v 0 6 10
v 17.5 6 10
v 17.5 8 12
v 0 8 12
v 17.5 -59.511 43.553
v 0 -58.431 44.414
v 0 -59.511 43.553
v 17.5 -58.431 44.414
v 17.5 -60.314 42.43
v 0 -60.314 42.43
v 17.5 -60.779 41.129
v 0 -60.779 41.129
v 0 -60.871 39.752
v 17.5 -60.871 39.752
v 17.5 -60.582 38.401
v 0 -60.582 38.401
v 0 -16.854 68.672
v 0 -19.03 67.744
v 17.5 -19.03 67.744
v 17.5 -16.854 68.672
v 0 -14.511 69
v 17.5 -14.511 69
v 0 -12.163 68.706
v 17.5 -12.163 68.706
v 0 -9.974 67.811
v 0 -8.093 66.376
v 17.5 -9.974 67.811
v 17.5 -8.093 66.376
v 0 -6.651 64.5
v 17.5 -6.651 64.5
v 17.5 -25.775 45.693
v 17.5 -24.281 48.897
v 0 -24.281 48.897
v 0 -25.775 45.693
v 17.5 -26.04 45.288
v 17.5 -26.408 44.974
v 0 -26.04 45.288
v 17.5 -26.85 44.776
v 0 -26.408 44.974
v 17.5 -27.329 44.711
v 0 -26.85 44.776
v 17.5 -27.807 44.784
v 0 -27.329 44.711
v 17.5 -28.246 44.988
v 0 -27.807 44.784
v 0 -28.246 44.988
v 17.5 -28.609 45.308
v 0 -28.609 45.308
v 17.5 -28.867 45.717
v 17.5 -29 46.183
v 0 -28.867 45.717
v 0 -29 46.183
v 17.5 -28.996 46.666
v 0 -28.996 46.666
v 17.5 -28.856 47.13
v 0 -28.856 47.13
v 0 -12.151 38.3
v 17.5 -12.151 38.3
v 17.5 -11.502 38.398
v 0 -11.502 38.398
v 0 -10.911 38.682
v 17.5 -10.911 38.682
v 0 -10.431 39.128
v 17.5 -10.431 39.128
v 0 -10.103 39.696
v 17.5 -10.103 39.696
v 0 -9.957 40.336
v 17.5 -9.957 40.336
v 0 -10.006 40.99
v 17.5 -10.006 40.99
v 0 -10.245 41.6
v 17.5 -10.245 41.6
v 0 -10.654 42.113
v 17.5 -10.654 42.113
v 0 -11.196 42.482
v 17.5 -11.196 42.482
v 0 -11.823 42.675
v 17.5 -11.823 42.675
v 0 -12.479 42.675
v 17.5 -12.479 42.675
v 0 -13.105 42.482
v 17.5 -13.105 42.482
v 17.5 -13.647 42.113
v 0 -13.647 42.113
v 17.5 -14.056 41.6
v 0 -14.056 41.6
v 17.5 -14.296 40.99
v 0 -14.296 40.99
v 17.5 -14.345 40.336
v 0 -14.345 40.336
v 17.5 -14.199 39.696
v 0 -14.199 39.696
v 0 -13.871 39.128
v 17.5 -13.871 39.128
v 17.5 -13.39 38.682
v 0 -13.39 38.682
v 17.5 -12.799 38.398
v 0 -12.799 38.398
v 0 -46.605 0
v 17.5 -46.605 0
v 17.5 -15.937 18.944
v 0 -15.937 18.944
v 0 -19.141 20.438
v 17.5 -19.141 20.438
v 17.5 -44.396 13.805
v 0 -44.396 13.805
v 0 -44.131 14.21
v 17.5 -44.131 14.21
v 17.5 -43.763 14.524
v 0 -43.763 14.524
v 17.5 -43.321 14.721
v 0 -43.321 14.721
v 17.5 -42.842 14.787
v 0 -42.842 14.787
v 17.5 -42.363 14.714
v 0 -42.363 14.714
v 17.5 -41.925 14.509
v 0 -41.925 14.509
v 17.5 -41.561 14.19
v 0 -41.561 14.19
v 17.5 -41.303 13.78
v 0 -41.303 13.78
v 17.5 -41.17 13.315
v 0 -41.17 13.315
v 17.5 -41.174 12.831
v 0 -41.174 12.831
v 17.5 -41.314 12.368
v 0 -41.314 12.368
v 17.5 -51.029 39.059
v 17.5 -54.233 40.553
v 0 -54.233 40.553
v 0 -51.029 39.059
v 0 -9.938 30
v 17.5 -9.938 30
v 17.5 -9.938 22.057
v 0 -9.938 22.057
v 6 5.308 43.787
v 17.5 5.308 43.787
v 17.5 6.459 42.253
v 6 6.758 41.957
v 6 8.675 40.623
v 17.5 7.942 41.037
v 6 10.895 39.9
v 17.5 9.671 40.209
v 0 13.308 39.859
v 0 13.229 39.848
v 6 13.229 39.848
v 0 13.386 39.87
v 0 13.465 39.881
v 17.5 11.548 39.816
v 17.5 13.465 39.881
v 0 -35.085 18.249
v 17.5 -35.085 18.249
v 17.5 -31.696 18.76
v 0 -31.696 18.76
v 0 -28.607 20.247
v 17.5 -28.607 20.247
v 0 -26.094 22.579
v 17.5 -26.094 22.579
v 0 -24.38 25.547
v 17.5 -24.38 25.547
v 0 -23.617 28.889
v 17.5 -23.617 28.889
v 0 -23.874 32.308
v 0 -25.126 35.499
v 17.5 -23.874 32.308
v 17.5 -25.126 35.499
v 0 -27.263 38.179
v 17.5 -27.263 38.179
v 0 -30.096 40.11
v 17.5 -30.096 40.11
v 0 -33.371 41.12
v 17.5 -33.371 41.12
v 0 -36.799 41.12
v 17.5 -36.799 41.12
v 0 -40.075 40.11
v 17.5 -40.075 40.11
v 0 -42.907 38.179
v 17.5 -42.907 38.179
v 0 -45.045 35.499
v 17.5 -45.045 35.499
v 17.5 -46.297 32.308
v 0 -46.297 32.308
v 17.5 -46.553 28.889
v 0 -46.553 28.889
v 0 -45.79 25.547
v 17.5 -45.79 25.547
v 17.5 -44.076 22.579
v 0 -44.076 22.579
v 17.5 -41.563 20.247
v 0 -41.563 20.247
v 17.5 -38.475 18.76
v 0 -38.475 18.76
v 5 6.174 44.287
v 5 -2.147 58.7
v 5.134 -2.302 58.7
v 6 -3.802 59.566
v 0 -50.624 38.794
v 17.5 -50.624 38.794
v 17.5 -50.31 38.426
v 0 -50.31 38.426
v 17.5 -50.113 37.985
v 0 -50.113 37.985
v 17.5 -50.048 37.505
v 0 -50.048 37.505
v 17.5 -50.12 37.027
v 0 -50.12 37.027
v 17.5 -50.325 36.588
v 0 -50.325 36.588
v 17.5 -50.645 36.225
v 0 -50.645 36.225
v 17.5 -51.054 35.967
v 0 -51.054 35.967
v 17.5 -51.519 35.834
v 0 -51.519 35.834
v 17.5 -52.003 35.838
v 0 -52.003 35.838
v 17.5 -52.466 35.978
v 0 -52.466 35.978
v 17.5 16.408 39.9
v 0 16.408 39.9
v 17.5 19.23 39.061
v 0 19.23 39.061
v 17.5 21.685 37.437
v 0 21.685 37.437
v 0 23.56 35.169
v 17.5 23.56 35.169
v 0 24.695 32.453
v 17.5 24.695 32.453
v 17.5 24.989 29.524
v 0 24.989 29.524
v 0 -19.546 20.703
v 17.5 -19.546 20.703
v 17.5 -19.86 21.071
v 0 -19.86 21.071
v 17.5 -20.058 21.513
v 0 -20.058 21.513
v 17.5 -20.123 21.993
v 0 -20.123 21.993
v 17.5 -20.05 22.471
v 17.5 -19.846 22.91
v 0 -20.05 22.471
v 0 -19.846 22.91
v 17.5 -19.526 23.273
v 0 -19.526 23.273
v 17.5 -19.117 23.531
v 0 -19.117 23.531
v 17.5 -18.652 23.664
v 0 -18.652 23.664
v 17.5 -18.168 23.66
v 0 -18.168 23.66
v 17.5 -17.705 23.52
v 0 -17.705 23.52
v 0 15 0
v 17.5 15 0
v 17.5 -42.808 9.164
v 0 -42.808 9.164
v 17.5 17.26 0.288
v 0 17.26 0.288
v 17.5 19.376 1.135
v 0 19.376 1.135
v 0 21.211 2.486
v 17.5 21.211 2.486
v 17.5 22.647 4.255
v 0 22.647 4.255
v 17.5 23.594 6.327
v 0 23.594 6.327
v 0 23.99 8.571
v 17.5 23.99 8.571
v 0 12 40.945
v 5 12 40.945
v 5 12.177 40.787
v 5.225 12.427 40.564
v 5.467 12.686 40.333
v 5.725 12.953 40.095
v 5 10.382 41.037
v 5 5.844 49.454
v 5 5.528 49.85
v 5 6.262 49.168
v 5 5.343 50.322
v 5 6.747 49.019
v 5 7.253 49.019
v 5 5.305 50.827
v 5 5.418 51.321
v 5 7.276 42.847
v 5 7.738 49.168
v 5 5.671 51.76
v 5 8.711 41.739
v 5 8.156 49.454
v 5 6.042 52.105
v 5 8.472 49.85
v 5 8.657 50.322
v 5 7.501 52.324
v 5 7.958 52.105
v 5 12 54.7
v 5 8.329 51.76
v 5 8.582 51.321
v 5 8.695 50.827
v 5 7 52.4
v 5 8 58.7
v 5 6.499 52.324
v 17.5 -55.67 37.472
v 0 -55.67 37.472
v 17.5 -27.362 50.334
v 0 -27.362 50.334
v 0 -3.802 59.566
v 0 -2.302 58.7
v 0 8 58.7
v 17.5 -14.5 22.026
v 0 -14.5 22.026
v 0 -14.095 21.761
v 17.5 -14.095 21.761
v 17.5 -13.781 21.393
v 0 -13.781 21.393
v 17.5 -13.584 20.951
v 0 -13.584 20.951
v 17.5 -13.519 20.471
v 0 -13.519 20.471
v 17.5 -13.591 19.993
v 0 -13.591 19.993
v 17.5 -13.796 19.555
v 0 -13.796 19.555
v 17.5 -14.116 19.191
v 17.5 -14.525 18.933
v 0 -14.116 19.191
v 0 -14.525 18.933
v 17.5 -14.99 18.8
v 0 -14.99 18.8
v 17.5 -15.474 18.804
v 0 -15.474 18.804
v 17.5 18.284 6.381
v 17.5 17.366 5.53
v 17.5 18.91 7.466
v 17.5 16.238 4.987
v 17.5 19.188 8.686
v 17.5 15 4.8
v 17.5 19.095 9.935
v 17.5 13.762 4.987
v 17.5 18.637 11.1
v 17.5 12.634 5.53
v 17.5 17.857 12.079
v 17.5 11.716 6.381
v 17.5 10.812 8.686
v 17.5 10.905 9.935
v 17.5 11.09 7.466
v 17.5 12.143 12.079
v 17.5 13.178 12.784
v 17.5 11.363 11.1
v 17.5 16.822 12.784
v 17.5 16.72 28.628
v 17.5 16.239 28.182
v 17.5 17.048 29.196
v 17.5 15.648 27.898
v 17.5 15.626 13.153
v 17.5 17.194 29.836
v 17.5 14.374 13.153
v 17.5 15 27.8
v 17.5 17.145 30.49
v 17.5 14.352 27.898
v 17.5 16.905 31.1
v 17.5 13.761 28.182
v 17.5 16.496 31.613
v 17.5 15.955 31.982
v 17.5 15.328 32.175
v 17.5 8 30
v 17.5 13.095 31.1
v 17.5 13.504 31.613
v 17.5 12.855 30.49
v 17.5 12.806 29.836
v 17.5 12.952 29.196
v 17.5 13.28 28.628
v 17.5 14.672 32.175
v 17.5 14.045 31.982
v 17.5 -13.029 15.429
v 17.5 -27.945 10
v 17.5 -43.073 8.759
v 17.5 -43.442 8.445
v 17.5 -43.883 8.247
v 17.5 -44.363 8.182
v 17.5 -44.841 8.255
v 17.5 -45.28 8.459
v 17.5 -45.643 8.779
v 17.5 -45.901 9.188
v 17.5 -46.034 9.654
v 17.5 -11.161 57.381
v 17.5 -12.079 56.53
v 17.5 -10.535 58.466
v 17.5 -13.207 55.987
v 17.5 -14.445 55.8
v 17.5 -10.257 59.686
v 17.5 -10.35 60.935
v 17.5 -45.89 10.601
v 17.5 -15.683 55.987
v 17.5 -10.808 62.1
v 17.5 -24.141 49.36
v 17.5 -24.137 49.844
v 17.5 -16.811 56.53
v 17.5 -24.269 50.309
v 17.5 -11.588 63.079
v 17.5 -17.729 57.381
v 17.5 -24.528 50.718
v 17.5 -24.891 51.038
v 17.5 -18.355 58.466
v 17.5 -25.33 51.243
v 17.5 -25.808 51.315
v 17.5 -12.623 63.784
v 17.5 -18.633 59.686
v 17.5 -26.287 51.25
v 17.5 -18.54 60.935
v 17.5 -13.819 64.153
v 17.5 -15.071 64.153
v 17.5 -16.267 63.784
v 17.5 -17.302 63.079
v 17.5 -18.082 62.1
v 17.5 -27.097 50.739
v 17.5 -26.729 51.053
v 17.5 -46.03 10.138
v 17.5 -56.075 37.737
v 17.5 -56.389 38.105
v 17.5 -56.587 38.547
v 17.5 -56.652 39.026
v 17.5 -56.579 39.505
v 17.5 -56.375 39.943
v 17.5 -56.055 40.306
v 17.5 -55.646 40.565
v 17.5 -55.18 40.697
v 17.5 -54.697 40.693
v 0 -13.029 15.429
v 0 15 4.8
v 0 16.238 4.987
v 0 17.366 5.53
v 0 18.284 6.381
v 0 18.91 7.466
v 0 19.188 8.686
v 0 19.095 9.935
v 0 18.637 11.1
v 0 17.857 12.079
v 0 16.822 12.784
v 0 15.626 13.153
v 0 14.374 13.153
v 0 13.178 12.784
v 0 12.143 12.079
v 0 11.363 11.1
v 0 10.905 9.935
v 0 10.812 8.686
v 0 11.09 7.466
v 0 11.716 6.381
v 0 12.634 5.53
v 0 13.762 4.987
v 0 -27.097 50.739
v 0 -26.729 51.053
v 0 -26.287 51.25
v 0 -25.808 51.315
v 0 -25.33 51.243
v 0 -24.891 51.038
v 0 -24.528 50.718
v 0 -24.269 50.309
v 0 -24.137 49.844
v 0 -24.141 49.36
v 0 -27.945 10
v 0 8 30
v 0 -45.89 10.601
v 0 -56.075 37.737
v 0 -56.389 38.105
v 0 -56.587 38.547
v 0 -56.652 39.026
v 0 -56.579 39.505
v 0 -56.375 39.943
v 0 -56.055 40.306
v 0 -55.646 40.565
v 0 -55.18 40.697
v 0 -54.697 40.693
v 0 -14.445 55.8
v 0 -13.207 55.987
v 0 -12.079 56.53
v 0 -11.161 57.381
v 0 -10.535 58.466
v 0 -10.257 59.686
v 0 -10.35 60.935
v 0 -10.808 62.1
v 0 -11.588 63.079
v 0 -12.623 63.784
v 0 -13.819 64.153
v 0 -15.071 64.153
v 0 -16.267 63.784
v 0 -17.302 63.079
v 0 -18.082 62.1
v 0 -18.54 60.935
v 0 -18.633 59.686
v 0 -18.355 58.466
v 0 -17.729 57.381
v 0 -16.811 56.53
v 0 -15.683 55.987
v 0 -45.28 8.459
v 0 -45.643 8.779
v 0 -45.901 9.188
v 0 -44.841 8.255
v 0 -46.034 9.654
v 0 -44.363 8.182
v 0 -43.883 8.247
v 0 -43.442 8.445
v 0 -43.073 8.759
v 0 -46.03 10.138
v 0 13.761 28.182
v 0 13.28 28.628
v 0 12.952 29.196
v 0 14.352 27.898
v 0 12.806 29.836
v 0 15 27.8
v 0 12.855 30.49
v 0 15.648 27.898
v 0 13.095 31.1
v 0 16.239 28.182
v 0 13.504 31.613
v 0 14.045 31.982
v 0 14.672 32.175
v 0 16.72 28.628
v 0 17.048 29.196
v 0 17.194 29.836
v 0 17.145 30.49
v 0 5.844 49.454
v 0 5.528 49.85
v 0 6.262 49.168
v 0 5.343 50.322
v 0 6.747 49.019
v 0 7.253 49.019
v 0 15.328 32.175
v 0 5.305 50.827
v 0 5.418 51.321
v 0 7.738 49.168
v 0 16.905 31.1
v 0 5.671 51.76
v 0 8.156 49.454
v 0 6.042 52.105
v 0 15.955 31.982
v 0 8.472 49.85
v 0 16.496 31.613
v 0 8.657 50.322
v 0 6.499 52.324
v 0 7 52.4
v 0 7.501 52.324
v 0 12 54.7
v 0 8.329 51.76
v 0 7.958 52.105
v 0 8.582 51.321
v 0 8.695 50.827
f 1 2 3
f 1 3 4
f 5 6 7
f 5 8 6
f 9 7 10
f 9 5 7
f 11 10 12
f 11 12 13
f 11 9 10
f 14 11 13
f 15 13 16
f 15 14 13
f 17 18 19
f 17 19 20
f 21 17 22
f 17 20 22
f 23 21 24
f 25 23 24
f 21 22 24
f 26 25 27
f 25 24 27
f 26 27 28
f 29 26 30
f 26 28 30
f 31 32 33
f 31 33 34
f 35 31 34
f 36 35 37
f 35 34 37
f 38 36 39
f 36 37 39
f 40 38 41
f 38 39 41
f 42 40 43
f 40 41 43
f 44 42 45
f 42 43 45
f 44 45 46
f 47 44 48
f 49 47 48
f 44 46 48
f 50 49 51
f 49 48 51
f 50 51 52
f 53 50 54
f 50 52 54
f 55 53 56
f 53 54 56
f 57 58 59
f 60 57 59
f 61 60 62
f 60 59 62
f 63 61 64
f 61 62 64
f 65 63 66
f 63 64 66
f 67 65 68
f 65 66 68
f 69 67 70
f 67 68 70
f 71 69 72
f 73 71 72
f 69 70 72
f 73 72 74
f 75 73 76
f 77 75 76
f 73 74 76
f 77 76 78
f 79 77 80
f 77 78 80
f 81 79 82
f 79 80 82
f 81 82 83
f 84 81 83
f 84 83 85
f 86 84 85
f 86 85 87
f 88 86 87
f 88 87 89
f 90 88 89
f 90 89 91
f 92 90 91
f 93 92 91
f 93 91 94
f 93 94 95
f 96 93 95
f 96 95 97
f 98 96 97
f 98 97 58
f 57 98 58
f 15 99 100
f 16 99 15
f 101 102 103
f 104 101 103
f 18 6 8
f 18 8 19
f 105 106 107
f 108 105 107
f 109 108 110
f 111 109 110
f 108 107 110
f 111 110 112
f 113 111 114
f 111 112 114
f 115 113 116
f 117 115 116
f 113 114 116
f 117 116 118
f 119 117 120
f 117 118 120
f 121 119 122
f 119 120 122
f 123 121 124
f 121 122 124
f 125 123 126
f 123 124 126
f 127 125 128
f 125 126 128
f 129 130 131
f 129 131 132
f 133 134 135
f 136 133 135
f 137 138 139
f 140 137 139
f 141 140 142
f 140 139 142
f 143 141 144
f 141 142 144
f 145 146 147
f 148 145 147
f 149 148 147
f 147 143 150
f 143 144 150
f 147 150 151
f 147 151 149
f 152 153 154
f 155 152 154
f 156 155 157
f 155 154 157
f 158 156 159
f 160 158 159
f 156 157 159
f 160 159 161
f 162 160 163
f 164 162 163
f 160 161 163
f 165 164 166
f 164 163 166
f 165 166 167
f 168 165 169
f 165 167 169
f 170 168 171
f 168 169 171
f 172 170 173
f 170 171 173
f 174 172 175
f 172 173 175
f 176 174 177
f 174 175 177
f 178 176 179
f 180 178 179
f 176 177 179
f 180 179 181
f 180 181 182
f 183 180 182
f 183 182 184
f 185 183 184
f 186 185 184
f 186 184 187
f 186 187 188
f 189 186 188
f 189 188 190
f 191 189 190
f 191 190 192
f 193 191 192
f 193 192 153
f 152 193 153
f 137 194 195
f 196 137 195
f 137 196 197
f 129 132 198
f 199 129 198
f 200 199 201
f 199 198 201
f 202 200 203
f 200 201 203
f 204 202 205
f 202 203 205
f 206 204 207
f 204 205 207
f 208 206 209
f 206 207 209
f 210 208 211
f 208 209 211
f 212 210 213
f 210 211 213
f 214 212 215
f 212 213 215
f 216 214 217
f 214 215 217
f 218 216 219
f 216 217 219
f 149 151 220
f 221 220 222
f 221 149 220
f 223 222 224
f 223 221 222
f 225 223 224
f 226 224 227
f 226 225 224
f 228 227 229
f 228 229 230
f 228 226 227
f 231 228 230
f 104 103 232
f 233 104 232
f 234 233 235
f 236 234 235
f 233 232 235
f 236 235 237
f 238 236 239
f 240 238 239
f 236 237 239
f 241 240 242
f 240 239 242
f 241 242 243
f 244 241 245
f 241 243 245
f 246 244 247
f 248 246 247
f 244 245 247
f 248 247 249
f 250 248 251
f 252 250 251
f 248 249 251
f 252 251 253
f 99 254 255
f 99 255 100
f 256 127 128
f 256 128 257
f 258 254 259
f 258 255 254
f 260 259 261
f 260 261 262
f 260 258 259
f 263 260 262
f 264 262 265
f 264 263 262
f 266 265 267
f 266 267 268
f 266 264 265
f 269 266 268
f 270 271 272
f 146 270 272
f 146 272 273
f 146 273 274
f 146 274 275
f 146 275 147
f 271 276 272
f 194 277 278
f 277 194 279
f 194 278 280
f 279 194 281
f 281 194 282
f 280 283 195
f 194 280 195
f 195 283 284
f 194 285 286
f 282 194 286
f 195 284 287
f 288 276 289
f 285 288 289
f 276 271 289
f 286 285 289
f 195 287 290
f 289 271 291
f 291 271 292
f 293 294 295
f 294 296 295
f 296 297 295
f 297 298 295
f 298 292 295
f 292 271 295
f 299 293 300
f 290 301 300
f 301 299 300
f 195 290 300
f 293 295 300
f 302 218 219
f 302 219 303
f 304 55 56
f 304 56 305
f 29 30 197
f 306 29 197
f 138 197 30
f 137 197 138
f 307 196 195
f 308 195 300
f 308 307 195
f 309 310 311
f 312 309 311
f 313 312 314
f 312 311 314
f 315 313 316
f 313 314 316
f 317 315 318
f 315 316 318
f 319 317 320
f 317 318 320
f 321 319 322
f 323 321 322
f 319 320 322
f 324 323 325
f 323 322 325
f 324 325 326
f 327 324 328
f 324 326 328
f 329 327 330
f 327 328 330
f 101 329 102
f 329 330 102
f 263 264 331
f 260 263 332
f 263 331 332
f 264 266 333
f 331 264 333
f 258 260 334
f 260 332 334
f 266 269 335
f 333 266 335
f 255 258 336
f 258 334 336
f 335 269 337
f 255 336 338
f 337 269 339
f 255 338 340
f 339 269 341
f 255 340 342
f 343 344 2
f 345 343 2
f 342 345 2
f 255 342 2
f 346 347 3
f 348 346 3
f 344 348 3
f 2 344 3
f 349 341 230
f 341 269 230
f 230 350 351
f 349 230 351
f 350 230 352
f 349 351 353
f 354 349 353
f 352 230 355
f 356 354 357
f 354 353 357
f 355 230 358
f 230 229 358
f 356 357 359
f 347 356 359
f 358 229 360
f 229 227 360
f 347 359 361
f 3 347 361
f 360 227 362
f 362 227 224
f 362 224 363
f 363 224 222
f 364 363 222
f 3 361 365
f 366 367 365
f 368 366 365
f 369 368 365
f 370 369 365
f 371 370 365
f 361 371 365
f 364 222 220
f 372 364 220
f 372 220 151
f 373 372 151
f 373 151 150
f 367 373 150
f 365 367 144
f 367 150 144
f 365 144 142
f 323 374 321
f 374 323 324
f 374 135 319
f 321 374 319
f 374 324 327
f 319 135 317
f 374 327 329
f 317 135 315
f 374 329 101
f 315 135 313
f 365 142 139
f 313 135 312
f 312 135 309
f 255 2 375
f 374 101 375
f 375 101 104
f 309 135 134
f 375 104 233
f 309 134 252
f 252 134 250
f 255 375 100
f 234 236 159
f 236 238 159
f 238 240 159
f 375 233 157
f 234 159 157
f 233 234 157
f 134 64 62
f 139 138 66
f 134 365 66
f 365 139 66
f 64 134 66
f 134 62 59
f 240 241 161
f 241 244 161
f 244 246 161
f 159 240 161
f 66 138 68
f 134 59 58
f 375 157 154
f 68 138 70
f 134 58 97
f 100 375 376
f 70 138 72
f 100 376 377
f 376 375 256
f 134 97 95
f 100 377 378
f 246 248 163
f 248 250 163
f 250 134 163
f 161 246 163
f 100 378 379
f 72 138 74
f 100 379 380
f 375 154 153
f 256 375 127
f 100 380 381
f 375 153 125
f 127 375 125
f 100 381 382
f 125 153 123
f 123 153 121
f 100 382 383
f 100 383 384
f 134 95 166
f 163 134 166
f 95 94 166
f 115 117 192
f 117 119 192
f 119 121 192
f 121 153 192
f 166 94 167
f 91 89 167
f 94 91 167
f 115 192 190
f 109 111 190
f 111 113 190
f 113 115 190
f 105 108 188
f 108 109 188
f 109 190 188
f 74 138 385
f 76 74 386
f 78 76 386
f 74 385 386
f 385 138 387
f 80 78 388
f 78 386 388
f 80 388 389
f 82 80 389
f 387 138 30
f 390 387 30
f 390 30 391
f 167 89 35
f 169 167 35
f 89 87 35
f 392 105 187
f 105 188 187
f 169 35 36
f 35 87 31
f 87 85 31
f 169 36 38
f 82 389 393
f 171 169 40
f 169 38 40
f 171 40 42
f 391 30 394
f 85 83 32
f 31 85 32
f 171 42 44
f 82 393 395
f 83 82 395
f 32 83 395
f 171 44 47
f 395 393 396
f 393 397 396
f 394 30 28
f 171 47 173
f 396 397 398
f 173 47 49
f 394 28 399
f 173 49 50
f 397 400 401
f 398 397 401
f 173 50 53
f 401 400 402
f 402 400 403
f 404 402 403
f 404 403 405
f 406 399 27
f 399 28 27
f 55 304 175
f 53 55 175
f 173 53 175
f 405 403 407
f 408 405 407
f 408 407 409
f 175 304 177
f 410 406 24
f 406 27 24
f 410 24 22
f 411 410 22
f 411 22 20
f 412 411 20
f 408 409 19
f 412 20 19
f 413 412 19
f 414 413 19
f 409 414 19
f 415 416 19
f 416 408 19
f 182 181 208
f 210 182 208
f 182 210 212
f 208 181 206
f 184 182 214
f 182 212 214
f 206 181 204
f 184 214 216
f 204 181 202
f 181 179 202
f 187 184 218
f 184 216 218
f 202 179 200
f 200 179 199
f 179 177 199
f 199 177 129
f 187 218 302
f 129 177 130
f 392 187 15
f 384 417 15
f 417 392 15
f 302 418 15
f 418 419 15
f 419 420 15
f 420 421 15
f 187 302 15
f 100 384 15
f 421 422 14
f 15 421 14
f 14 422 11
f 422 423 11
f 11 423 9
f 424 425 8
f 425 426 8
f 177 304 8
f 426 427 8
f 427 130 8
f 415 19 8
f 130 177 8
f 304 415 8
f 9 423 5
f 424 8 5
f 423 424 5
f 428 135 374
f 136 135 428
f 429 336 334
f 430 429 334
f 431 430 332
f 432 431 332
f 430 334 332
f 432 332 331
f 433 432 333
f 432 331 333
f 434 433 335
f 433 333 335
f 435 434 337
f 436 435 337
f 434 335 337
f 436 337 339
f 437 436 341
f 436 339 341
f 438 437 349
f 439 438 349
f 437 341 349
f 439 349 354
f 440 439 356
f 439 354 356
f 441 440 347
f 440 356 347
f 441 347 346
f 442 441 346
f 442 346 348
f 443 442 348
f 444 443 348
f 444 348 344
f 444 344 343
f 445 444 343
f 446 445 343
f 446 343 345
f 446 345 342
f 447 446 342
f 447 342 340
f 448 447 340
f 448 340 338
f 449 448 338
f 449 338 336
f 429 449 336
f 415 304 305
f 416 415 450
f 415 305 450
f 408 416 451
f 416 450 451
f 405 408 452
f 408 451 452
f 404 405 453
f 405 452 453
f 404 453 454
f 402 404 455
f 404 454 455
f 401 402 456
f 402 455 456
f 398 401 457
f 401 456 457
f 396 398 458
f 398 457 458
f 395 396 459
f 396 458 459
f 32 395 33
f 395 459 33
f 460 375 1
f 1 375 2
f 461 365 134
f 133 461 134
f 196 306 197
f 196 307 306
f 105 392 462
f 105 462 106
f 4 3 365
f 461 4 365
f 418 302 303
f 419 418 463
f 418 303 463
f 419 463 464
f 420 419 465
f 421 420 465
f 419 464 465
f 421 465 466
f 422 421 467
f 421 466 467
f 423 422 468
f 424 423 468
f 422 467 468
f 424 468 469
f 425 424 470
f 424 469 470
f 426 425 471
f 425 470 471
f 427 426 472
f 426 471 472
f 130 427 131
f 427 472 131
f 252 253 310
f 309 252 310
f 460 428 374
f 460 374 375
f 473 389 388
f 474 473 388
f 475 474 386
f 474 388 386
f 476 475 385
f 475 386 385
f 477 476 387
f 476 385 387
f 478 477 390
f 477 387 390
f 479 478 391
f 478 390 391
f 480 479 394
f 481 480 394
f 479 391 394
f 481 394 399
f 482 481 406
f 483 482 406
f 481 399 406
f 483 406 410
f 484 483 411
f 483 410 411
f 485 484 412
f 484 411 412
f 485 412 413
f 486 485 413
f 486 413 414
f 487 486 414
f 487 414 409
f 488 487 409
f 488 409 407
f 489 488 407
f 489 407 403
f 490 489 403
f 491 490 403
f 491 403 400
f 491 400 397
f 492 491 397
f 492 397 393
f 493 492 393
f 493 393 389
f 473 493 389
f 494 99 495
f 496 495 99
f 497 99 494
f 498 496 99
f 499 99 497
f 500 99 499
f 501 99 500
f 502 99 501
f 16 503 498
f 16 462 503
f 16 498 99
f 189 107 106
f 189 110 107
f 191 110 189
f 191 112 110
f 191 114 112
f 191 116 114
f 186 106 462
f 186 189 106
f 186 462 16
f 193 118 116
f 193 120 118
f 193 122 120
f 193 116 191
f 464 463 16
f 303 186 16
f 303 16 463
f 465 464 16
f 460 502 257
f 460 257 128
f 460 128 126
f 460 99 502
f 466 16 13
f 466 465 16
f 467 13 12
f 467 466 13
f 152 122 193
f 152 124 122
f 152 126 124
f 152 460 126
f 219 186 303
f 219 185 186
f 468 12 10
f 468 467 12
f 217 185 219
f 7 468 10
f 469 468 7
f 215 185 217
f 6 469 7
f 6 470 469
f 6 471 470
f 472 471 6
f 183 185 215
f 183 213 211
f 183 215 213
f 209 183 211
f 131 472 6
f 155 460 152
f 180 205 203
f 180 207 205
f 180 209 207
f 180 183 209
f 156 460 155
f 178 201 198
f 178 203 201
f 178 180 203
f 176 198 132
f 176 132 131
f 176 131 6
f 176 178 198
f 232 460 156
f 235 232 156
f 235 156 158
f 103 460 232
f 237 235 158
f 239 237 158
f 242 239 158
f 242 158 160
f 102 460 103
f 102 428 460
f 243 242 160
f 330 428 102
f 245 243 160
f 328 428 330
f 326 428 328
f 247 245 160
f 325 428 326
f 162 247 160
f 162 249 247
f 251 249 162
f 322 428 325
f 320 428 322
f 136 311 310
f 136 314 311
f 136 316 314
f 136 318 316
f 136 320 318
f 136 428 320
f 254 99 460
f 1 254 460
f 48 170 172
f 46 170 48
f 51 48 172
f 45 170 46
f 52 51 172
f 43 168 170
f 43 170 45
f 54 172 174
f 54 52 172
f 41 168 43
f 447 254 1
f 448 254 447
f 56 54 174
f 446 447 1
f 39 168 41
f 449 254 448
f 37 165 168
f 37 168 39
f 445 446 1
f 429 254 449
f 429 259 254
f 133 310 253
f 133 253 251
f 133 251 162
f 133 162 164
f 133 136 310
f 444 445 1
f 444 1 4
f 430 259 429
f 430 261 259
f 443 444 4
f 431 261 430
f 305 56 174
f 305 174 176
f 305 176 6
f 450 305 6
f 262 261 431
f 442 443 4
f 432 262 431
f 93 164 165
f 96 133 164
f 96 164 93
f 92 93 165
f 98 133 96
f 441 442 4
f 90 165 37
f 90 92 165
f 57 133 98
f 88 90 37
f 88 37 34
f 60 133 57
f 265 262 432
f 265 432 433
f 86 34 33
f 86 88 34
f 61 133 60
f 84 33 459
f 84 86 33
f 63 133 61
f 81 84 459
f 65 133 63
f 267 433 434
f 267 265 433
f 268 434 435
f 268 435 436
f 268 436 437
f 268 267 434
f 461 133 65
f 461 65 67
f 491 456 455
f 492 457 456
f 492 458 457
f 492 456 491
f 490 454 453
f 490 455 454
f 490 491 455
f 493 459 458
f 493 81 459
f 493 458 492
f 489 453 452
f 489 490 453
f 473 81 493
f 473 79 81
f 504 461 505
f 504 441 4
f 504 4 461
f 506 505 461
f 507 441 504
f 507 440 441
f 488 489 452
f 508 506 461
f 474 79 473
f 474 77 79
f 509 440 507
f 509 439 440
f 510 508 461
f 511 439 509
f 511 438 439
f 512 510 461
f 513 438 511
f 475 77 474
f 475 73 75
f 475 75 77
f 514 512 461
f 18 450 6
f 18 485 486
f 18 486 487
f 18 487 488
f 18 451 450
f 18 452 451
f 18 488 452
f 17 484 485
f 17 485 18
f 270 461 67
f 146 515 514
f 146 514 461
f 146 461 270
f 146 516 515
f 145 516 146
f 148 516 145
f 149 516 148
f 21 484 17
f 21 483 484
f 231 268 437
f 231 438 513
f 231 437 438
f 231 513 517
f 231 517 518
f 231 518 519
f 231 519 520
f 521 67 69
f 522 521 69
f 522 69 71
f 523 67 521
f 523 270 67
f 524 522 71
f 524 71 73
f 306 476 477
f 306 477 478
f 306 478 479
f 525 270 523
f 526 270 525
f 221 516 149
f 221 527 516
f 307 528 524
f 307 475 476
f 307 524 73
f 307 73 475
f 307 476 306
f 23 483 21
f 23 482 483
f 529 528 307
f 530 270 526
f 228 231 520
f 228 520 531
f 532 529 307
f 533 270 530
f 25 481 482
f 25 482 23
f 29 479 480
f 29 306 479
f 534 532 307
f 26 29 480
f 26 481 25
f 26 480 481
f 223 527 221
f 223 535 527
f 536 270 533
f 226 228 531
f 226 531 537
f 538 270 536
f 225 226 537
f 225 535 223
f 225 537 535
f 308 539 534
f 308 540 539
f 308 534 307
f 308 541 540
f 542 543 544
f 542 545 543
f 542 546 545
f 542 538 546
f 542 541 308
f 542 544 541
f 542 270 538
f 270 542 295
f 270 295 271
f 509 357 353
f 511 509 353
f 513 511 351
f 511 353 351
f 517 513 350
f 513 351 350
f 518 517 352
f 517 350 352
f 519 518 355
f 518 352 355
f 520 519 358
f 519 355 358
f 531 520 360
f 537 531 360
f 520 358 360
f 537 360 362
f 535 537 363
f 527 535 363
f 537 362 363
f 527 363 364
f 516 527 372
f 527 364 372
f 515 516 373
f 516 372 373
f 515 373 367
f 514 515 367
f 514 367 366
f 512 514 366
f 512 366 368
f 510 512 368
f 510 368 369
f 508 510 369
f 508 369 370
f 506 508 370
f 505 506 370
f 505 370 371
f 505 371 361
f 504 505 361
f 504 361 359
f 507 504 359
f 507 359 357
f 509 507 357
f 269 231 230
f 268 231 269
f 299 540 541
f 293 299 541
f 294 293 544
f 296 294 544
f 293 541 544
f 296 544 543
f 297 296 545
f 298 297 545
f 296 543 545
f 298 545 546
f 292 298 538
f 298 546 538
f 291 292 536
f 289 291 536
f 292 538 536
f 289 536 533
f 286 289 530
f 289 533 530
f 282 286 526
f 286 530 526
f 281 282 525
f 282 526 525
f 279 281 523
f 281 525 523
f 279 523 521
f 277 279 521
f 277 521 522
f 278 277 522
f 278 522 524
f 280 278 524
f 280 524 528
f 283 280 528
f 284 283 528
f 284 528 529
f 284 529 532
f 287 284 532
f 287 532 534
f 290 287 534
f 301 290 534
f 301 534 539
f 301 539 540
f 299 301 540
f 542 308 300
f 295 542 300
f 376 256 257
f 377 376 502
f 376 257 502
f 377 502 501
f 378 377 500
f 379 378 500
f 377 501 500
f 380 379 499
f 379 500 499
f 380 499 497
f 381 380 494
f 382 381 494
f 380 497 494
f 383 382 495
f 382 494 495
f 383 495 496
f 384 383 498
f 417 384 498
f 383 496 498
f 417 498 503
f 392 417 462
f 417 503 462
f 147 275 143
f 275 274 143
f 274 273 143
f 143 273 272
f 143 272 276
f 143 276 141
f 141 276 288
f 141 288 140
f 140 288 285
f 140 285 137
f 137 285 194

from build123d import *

# Parameters (mm, degrees)
BOSS_EXTRUDE1_DEPTH = 17.5
BOSS_EXTRUDE2_DEPTH = 5
CUT_EXTRUDE1_DEPTH  = 97.89865525603899
CUT_EXTRUDE2_DEPTH  = 97.89865525603899
CUT_EXTRUDE3_DEPTH  = 97.89865525603899
CUT_EXTRUDE4_DEPTH  = 97.89865525603899
CUT_EXTRUDE5_DEPTH  = 97.898655256039
HOLE1_D             = 3.4
HOLE2_D             = 8.4
HOLE3_D             = 4.4
HOLE4_D             = 23
HOLE5_D             = 8.4
HOLE6_D             = 4.4
FILLET1_R           = 8
CHAMFER1_SIZE       = 3.2892742843300167
CHAMFER1_SIZE2      = 5.503472902596259
CHAMFER2_SIZE       = 1.0000000000000073
CHAMFER3_SIZE       = 3.9999999999999973
CHAMFER4_SIZE       = 1.9999999999999982
CHAMFER5_SIZE       = 1.154784669
CHAMFER6_SIZE       = 0.9999999999999983
FILLET2_R           = 5
FILLET3_R           = 8.99999999999999
FILLET4_R           = 9.000000000000002


with BuildPart() as part:
    # Sketch1 → Boss-Extrude1 (new body)
    with BuildSketch(Plane(origin=(0, 0, 0), x_dir=(-6e-17, -1, 0), z_dir=(-1, 6e-17, 0))):
        with BuildLine():
            Line((11.200465877219063, 72.38053808131822), (-8.757531911002138, 37.812271894771776))
            ThreePointArc((-8.757531911002138, 37.812271894771776), (-19.5478712071735, 38.906001767514), (-24.988655696858714, 29.523809523809472))
            Line((-24.988655696858714, 29.523809523809472), (-23.581163303210467, 5.42e-15))
            Line((-23.581163303210467, 5.42e-15), (46.60534104687875, -6.94e-15))
            Line((46.60534104687875, -6.94e-15), (62.00126690227817, 42.299958639307405))
            Line((62.00126690227817, 42.299958639307405), (11.200465877219063, 72.38053808131822))
        make_face()
    extrude(amount=-BOSS_EXTRUDE1_DEPTH)

    # Sketch2 → Boss-Extrude2 (add)
    with BuildSketch(Plane(origin=(0, 0, 0), x_dir=(-6e-17, -1, 0), z_dir=(-1, 6e-17, 0))):
        with BuildLine():
            Line((-8.757531911002138, 37.812271894771776), (3.3020035333110394, 58.69999999999994))
            Line((3.3020035333110394, 58.69999999999994), (-12.000000000000004, 58.699999999999946))
            Line((-12.000000000000004, 58.699999999999946), (-12.000000000000004, 39.539392014169366))
            ThreePointArc((-12.000000000000004, 39.539392014169366), (-10.298772493194686, 38.826010419734104), (-8.757531911002138, 37.812271894771776))
        make_face()
    extrude(amount=-BOSS_EXTRUDE2_DEPTH)

    # Sketch3 → Cut-Extrude1 (cut, through all)
    with BuildSketch(Plane.ZY):
        with BuildLine():
            Line((18.94418997404675, -15.937202057164905), (20.43837116769735, -19.141483967443826))
            ThreePointArc((20.43837116769735, -19.141483967443826), (22.697545450618843, -19.96375616044696), (23.519817643621966, -17.70458187752546))
            Line((23.519817643621966, -17.70458187752546), (22.02563644997135, -14.500299967246516))
            ThreePointArc((22.02563644997135, -14.500299967246516), (19.766462167049855, -13.67802777424341), (18.94418997404675, -15.937202057164905))
        make_face()
    extrude(amount=-CUT_EXTRUDE1_DEPTH, mode=Mode.SUBTRACT)

    # Sketch4 → Cut-Extrude2 (cut, through all)
    with BuildSketch(Plane.ZY):
        with BuildLine():
            Line((48.89693341141304, -24.280652217339153), (45.692651501134065, -25.774833410989757))
            ThreePointArc((45.692651501134065, -25.774833410989757), (44.87037930813095, -28.034007693911235), (47.12955359105242, -28.85627988691438))
            Line((47.12955359105242, -28.85627988691438), (50.33383550133139, -27.362098693263775))
            ThreePointArc((50.33383550133139, -27.362098693263775), (51.156107694334516, -25.102924410342293), (48.89693341141304, -24.280652217339153))
        make_face()
    extrude(amount=-CUT_EXTRUDE2_DEPTH, mode=Mode.SUBTRACT)

    # Sketch5 → Cut-Extrude3 (cut, through all)
    with BuildSketch(Plane.ZY):
        with BuildLine():
            Line((35.97785558166356, -52.46601583434486), (37.47203677531419, -55.6702977446238))
            ThreePointArc((37.47203677531419, -55.6702977446238), (39.73121105823568, -56.4925699376269), (40.55348325123879, -54.233395654705404))
            Line((40.55348325123879, -54.233395654705404), (39.059302057588205, -51.02911374442645))
            ThreePointArc((39.059302057588205, -51.02911374442645), (36.80012777466672, -50.20684155142337), (35.97785558166356, -52.46601583434486))
        make_face()
    extrude(amount=-CUT_EXTRUDE3_DEPTH, mode=Mode.SUBTRACT)

    # Sketch6 → Cut-Extrude4 (cut, through all)
    with BuildSketch(Plane.ZY):
        with BuildLine():
            Line((10.600739813872503, -45.8899454945312), (13.805021724151473, -44.395764300880586))
            ThreePointArc((13.805021724151473, -44.395764300880586), (14.627293917154569, -42.136590017959094), (12.36811963423308, -41.314317824955985))
            Line((12.36811963423308, -41.314317824955985), (9.163837723954103, -42.8084990186066))
            ThreePointArc((9.163837723954103, -42.8084990186066), (8.341565530951023, -45.06767330152808), (10.600739813872503, -45.8899454945312))
        make_face()
    extrude(amount=-CUT_EXTRUDE4_DEPTH, mode=Mode.SUBTRACT)

    # Sketch7 → Cut-Extrude5 (cut, through all)
    with BuildSketch(Plane(origin=(17.5, -1.07e-15, 0), x_dir=(0, 0, -1), z_dir=(1, -6e-17, 0))):
        Polygon((-30.000000000000007, 8.000000000000005), (-30.000000000000007, -9.938112905604582), (-16.55393055212617, -9.938112905604578), (-10.000000000000002, -27.94488910624502), (-10.000000000000002, 8.000000000000005), align=None)
    extrude(amount=-CUT_EXTRUDE5_DEPTH, mode=Mode.SUBTRACT)

    # Hole1 (through all)
    with Locations(Plane(origin=(5, -3.1e-16, 0), x_dir=(0, 0, -1), z_dir=(1, -6e-17, 0))):
        with Locations((-50.7, 7)):
            Hole(HOLE1_D / 2)

    # Hole2 (through all)
    with Locations(Plane.ZY):
        with Locations((9, 15)):
            Hole(HOLE2_D / 2)

    # Hole3 (through all)
    with Locations(Plane.ZY):
        with Locations((40.5, -12.150669091)):
            Hole(HOLE3_D / 2)

    # Hole4 (through all)
    with Locations(Plane.ZY):
        with Locations((29.748836613, -35.085298856)):
            Hole(HOLE4_D / 2)

    # Hole5 (through all)
    with Locations(Plane.ZY):
        with Locations((60, -14.444863729)):
            Hole(HOLE5_D / 2)

    # Hole6 (through all)
    with Locations(Plane.ZY):
        with Locations((30, 15)):
            Hole(HOLE6_D / 2)

    # Fillet1
    fillet1_edges = [part.edges().sort_by_distance(p)[0] for p in [
        (11.25, 8.757531911002138, 37.812271894771776),
    ]]
    fillet(fillet1_edges, radius=FILLET1_R)

    # Chamfer1
    chamfer1_edges = [part.edges().sort_by_distance(p)[0] for p in [
        (8.75, -9.93811290560458, 16.55393055212617),
    ]]
    chamfer1_side = [part.faces().sort_by_distance(p)[0] for p in [
        (8.750000000000002, -18.941501005924803, 13.276965276063088),
    ]]
    chamfer(chamfer1_edges, length=CHAMFER1_SIZE, length2=CHAMFER1_SIZE2, reference=chamfer1_side[0])

    # Chamfer2
    chamfer2_edges = [part.edges().sort_by_distance(p)[0] for p in [
        (2.5, -3.3020035333110394, 58.69999999999994),
    ]]
    chamfer(chamfer2_edges, length=CHAMFER2_SIZE)

    # Chamfer3
    chamfer3_edges = [part.edges().sort_by_distance(p)[0] for p in [
        (2.500000000000001, 12.000000000000004, 58.699999999999946),
    ]]
    chamfer(chamfer3_edges, length=CHAMFER3_SIZE)

    # Chamfer4
    chamfer4_edges = [part.edges().sort_by_distance(p)[0] for p in [
        (8.75, 8.000000000000004, 10.000000000000002),
    ]]
    chamfer(chamfer4_edges, length=CHAMFER4_SIZE)

    # Chamfer5
    # the kernel refuses this chamfer: 1.339656624, 1.154784669 mm, written as the material it adds along each edge
    with BuildSketch(Plane(origin=(5.000000000000001, 12.000000000000004, 39.790087105703904), x_dir=(0, 0, 1), z_dir=(-1, 6e-17, 0))) as chamfer5_piece_1:
        with BuildLine():
            Line((CHAMFER5_SIZE, 0), (0.05834718904861802, 1.2292620817061763))
            ThreePointArc((0.05834718904861802, 1.2292620817061763), (0.00643151248669227, 0.6348707855031801), (0, 0))
            Line((0, 0), (CHAMFER5_SIZE, 0))
        make_face()
    extrude(amount=5)

    # Chamfer6
    chamfer6_edges = [part.edges().sort_by_distance(p)[0] for p in [
        (5.000000000000001, 0.7531265976075634, 51.67630858194548),
        (5, 8.674926913627807, 40.6231092014468),
    ]]
    chamfer(chamfer6_edges, length=CHAMFER6_SIZE)

    # Fillet2
    fillet2_edges = [part.edges().sort_by_distance(p)[0] for p in [
        (8.749999999999996, -62.00126690227817, 42.299958639307405),
    ]]
    fillet(fillet2_edges, radius=FILLET2_R)

    # Fillet3
    fillet3_edges = [part.edges().sort_by_distance(p)[0] for p in [
        (8.75, -11.200465877219063, 72.38053808131822),
    ]]
    fillet(fillet3_edges, radius=FILLET3_R)

    # Fillet4
    fillet4_edges = [part.edges().sort_by_distance(p)[0] for p in [
        (8.750000000000002, 23.581163303210467, 5.42e-15),
    ]]
    fillet(fillet4_edges, radius=FILLET4_R)


solid = part.part
